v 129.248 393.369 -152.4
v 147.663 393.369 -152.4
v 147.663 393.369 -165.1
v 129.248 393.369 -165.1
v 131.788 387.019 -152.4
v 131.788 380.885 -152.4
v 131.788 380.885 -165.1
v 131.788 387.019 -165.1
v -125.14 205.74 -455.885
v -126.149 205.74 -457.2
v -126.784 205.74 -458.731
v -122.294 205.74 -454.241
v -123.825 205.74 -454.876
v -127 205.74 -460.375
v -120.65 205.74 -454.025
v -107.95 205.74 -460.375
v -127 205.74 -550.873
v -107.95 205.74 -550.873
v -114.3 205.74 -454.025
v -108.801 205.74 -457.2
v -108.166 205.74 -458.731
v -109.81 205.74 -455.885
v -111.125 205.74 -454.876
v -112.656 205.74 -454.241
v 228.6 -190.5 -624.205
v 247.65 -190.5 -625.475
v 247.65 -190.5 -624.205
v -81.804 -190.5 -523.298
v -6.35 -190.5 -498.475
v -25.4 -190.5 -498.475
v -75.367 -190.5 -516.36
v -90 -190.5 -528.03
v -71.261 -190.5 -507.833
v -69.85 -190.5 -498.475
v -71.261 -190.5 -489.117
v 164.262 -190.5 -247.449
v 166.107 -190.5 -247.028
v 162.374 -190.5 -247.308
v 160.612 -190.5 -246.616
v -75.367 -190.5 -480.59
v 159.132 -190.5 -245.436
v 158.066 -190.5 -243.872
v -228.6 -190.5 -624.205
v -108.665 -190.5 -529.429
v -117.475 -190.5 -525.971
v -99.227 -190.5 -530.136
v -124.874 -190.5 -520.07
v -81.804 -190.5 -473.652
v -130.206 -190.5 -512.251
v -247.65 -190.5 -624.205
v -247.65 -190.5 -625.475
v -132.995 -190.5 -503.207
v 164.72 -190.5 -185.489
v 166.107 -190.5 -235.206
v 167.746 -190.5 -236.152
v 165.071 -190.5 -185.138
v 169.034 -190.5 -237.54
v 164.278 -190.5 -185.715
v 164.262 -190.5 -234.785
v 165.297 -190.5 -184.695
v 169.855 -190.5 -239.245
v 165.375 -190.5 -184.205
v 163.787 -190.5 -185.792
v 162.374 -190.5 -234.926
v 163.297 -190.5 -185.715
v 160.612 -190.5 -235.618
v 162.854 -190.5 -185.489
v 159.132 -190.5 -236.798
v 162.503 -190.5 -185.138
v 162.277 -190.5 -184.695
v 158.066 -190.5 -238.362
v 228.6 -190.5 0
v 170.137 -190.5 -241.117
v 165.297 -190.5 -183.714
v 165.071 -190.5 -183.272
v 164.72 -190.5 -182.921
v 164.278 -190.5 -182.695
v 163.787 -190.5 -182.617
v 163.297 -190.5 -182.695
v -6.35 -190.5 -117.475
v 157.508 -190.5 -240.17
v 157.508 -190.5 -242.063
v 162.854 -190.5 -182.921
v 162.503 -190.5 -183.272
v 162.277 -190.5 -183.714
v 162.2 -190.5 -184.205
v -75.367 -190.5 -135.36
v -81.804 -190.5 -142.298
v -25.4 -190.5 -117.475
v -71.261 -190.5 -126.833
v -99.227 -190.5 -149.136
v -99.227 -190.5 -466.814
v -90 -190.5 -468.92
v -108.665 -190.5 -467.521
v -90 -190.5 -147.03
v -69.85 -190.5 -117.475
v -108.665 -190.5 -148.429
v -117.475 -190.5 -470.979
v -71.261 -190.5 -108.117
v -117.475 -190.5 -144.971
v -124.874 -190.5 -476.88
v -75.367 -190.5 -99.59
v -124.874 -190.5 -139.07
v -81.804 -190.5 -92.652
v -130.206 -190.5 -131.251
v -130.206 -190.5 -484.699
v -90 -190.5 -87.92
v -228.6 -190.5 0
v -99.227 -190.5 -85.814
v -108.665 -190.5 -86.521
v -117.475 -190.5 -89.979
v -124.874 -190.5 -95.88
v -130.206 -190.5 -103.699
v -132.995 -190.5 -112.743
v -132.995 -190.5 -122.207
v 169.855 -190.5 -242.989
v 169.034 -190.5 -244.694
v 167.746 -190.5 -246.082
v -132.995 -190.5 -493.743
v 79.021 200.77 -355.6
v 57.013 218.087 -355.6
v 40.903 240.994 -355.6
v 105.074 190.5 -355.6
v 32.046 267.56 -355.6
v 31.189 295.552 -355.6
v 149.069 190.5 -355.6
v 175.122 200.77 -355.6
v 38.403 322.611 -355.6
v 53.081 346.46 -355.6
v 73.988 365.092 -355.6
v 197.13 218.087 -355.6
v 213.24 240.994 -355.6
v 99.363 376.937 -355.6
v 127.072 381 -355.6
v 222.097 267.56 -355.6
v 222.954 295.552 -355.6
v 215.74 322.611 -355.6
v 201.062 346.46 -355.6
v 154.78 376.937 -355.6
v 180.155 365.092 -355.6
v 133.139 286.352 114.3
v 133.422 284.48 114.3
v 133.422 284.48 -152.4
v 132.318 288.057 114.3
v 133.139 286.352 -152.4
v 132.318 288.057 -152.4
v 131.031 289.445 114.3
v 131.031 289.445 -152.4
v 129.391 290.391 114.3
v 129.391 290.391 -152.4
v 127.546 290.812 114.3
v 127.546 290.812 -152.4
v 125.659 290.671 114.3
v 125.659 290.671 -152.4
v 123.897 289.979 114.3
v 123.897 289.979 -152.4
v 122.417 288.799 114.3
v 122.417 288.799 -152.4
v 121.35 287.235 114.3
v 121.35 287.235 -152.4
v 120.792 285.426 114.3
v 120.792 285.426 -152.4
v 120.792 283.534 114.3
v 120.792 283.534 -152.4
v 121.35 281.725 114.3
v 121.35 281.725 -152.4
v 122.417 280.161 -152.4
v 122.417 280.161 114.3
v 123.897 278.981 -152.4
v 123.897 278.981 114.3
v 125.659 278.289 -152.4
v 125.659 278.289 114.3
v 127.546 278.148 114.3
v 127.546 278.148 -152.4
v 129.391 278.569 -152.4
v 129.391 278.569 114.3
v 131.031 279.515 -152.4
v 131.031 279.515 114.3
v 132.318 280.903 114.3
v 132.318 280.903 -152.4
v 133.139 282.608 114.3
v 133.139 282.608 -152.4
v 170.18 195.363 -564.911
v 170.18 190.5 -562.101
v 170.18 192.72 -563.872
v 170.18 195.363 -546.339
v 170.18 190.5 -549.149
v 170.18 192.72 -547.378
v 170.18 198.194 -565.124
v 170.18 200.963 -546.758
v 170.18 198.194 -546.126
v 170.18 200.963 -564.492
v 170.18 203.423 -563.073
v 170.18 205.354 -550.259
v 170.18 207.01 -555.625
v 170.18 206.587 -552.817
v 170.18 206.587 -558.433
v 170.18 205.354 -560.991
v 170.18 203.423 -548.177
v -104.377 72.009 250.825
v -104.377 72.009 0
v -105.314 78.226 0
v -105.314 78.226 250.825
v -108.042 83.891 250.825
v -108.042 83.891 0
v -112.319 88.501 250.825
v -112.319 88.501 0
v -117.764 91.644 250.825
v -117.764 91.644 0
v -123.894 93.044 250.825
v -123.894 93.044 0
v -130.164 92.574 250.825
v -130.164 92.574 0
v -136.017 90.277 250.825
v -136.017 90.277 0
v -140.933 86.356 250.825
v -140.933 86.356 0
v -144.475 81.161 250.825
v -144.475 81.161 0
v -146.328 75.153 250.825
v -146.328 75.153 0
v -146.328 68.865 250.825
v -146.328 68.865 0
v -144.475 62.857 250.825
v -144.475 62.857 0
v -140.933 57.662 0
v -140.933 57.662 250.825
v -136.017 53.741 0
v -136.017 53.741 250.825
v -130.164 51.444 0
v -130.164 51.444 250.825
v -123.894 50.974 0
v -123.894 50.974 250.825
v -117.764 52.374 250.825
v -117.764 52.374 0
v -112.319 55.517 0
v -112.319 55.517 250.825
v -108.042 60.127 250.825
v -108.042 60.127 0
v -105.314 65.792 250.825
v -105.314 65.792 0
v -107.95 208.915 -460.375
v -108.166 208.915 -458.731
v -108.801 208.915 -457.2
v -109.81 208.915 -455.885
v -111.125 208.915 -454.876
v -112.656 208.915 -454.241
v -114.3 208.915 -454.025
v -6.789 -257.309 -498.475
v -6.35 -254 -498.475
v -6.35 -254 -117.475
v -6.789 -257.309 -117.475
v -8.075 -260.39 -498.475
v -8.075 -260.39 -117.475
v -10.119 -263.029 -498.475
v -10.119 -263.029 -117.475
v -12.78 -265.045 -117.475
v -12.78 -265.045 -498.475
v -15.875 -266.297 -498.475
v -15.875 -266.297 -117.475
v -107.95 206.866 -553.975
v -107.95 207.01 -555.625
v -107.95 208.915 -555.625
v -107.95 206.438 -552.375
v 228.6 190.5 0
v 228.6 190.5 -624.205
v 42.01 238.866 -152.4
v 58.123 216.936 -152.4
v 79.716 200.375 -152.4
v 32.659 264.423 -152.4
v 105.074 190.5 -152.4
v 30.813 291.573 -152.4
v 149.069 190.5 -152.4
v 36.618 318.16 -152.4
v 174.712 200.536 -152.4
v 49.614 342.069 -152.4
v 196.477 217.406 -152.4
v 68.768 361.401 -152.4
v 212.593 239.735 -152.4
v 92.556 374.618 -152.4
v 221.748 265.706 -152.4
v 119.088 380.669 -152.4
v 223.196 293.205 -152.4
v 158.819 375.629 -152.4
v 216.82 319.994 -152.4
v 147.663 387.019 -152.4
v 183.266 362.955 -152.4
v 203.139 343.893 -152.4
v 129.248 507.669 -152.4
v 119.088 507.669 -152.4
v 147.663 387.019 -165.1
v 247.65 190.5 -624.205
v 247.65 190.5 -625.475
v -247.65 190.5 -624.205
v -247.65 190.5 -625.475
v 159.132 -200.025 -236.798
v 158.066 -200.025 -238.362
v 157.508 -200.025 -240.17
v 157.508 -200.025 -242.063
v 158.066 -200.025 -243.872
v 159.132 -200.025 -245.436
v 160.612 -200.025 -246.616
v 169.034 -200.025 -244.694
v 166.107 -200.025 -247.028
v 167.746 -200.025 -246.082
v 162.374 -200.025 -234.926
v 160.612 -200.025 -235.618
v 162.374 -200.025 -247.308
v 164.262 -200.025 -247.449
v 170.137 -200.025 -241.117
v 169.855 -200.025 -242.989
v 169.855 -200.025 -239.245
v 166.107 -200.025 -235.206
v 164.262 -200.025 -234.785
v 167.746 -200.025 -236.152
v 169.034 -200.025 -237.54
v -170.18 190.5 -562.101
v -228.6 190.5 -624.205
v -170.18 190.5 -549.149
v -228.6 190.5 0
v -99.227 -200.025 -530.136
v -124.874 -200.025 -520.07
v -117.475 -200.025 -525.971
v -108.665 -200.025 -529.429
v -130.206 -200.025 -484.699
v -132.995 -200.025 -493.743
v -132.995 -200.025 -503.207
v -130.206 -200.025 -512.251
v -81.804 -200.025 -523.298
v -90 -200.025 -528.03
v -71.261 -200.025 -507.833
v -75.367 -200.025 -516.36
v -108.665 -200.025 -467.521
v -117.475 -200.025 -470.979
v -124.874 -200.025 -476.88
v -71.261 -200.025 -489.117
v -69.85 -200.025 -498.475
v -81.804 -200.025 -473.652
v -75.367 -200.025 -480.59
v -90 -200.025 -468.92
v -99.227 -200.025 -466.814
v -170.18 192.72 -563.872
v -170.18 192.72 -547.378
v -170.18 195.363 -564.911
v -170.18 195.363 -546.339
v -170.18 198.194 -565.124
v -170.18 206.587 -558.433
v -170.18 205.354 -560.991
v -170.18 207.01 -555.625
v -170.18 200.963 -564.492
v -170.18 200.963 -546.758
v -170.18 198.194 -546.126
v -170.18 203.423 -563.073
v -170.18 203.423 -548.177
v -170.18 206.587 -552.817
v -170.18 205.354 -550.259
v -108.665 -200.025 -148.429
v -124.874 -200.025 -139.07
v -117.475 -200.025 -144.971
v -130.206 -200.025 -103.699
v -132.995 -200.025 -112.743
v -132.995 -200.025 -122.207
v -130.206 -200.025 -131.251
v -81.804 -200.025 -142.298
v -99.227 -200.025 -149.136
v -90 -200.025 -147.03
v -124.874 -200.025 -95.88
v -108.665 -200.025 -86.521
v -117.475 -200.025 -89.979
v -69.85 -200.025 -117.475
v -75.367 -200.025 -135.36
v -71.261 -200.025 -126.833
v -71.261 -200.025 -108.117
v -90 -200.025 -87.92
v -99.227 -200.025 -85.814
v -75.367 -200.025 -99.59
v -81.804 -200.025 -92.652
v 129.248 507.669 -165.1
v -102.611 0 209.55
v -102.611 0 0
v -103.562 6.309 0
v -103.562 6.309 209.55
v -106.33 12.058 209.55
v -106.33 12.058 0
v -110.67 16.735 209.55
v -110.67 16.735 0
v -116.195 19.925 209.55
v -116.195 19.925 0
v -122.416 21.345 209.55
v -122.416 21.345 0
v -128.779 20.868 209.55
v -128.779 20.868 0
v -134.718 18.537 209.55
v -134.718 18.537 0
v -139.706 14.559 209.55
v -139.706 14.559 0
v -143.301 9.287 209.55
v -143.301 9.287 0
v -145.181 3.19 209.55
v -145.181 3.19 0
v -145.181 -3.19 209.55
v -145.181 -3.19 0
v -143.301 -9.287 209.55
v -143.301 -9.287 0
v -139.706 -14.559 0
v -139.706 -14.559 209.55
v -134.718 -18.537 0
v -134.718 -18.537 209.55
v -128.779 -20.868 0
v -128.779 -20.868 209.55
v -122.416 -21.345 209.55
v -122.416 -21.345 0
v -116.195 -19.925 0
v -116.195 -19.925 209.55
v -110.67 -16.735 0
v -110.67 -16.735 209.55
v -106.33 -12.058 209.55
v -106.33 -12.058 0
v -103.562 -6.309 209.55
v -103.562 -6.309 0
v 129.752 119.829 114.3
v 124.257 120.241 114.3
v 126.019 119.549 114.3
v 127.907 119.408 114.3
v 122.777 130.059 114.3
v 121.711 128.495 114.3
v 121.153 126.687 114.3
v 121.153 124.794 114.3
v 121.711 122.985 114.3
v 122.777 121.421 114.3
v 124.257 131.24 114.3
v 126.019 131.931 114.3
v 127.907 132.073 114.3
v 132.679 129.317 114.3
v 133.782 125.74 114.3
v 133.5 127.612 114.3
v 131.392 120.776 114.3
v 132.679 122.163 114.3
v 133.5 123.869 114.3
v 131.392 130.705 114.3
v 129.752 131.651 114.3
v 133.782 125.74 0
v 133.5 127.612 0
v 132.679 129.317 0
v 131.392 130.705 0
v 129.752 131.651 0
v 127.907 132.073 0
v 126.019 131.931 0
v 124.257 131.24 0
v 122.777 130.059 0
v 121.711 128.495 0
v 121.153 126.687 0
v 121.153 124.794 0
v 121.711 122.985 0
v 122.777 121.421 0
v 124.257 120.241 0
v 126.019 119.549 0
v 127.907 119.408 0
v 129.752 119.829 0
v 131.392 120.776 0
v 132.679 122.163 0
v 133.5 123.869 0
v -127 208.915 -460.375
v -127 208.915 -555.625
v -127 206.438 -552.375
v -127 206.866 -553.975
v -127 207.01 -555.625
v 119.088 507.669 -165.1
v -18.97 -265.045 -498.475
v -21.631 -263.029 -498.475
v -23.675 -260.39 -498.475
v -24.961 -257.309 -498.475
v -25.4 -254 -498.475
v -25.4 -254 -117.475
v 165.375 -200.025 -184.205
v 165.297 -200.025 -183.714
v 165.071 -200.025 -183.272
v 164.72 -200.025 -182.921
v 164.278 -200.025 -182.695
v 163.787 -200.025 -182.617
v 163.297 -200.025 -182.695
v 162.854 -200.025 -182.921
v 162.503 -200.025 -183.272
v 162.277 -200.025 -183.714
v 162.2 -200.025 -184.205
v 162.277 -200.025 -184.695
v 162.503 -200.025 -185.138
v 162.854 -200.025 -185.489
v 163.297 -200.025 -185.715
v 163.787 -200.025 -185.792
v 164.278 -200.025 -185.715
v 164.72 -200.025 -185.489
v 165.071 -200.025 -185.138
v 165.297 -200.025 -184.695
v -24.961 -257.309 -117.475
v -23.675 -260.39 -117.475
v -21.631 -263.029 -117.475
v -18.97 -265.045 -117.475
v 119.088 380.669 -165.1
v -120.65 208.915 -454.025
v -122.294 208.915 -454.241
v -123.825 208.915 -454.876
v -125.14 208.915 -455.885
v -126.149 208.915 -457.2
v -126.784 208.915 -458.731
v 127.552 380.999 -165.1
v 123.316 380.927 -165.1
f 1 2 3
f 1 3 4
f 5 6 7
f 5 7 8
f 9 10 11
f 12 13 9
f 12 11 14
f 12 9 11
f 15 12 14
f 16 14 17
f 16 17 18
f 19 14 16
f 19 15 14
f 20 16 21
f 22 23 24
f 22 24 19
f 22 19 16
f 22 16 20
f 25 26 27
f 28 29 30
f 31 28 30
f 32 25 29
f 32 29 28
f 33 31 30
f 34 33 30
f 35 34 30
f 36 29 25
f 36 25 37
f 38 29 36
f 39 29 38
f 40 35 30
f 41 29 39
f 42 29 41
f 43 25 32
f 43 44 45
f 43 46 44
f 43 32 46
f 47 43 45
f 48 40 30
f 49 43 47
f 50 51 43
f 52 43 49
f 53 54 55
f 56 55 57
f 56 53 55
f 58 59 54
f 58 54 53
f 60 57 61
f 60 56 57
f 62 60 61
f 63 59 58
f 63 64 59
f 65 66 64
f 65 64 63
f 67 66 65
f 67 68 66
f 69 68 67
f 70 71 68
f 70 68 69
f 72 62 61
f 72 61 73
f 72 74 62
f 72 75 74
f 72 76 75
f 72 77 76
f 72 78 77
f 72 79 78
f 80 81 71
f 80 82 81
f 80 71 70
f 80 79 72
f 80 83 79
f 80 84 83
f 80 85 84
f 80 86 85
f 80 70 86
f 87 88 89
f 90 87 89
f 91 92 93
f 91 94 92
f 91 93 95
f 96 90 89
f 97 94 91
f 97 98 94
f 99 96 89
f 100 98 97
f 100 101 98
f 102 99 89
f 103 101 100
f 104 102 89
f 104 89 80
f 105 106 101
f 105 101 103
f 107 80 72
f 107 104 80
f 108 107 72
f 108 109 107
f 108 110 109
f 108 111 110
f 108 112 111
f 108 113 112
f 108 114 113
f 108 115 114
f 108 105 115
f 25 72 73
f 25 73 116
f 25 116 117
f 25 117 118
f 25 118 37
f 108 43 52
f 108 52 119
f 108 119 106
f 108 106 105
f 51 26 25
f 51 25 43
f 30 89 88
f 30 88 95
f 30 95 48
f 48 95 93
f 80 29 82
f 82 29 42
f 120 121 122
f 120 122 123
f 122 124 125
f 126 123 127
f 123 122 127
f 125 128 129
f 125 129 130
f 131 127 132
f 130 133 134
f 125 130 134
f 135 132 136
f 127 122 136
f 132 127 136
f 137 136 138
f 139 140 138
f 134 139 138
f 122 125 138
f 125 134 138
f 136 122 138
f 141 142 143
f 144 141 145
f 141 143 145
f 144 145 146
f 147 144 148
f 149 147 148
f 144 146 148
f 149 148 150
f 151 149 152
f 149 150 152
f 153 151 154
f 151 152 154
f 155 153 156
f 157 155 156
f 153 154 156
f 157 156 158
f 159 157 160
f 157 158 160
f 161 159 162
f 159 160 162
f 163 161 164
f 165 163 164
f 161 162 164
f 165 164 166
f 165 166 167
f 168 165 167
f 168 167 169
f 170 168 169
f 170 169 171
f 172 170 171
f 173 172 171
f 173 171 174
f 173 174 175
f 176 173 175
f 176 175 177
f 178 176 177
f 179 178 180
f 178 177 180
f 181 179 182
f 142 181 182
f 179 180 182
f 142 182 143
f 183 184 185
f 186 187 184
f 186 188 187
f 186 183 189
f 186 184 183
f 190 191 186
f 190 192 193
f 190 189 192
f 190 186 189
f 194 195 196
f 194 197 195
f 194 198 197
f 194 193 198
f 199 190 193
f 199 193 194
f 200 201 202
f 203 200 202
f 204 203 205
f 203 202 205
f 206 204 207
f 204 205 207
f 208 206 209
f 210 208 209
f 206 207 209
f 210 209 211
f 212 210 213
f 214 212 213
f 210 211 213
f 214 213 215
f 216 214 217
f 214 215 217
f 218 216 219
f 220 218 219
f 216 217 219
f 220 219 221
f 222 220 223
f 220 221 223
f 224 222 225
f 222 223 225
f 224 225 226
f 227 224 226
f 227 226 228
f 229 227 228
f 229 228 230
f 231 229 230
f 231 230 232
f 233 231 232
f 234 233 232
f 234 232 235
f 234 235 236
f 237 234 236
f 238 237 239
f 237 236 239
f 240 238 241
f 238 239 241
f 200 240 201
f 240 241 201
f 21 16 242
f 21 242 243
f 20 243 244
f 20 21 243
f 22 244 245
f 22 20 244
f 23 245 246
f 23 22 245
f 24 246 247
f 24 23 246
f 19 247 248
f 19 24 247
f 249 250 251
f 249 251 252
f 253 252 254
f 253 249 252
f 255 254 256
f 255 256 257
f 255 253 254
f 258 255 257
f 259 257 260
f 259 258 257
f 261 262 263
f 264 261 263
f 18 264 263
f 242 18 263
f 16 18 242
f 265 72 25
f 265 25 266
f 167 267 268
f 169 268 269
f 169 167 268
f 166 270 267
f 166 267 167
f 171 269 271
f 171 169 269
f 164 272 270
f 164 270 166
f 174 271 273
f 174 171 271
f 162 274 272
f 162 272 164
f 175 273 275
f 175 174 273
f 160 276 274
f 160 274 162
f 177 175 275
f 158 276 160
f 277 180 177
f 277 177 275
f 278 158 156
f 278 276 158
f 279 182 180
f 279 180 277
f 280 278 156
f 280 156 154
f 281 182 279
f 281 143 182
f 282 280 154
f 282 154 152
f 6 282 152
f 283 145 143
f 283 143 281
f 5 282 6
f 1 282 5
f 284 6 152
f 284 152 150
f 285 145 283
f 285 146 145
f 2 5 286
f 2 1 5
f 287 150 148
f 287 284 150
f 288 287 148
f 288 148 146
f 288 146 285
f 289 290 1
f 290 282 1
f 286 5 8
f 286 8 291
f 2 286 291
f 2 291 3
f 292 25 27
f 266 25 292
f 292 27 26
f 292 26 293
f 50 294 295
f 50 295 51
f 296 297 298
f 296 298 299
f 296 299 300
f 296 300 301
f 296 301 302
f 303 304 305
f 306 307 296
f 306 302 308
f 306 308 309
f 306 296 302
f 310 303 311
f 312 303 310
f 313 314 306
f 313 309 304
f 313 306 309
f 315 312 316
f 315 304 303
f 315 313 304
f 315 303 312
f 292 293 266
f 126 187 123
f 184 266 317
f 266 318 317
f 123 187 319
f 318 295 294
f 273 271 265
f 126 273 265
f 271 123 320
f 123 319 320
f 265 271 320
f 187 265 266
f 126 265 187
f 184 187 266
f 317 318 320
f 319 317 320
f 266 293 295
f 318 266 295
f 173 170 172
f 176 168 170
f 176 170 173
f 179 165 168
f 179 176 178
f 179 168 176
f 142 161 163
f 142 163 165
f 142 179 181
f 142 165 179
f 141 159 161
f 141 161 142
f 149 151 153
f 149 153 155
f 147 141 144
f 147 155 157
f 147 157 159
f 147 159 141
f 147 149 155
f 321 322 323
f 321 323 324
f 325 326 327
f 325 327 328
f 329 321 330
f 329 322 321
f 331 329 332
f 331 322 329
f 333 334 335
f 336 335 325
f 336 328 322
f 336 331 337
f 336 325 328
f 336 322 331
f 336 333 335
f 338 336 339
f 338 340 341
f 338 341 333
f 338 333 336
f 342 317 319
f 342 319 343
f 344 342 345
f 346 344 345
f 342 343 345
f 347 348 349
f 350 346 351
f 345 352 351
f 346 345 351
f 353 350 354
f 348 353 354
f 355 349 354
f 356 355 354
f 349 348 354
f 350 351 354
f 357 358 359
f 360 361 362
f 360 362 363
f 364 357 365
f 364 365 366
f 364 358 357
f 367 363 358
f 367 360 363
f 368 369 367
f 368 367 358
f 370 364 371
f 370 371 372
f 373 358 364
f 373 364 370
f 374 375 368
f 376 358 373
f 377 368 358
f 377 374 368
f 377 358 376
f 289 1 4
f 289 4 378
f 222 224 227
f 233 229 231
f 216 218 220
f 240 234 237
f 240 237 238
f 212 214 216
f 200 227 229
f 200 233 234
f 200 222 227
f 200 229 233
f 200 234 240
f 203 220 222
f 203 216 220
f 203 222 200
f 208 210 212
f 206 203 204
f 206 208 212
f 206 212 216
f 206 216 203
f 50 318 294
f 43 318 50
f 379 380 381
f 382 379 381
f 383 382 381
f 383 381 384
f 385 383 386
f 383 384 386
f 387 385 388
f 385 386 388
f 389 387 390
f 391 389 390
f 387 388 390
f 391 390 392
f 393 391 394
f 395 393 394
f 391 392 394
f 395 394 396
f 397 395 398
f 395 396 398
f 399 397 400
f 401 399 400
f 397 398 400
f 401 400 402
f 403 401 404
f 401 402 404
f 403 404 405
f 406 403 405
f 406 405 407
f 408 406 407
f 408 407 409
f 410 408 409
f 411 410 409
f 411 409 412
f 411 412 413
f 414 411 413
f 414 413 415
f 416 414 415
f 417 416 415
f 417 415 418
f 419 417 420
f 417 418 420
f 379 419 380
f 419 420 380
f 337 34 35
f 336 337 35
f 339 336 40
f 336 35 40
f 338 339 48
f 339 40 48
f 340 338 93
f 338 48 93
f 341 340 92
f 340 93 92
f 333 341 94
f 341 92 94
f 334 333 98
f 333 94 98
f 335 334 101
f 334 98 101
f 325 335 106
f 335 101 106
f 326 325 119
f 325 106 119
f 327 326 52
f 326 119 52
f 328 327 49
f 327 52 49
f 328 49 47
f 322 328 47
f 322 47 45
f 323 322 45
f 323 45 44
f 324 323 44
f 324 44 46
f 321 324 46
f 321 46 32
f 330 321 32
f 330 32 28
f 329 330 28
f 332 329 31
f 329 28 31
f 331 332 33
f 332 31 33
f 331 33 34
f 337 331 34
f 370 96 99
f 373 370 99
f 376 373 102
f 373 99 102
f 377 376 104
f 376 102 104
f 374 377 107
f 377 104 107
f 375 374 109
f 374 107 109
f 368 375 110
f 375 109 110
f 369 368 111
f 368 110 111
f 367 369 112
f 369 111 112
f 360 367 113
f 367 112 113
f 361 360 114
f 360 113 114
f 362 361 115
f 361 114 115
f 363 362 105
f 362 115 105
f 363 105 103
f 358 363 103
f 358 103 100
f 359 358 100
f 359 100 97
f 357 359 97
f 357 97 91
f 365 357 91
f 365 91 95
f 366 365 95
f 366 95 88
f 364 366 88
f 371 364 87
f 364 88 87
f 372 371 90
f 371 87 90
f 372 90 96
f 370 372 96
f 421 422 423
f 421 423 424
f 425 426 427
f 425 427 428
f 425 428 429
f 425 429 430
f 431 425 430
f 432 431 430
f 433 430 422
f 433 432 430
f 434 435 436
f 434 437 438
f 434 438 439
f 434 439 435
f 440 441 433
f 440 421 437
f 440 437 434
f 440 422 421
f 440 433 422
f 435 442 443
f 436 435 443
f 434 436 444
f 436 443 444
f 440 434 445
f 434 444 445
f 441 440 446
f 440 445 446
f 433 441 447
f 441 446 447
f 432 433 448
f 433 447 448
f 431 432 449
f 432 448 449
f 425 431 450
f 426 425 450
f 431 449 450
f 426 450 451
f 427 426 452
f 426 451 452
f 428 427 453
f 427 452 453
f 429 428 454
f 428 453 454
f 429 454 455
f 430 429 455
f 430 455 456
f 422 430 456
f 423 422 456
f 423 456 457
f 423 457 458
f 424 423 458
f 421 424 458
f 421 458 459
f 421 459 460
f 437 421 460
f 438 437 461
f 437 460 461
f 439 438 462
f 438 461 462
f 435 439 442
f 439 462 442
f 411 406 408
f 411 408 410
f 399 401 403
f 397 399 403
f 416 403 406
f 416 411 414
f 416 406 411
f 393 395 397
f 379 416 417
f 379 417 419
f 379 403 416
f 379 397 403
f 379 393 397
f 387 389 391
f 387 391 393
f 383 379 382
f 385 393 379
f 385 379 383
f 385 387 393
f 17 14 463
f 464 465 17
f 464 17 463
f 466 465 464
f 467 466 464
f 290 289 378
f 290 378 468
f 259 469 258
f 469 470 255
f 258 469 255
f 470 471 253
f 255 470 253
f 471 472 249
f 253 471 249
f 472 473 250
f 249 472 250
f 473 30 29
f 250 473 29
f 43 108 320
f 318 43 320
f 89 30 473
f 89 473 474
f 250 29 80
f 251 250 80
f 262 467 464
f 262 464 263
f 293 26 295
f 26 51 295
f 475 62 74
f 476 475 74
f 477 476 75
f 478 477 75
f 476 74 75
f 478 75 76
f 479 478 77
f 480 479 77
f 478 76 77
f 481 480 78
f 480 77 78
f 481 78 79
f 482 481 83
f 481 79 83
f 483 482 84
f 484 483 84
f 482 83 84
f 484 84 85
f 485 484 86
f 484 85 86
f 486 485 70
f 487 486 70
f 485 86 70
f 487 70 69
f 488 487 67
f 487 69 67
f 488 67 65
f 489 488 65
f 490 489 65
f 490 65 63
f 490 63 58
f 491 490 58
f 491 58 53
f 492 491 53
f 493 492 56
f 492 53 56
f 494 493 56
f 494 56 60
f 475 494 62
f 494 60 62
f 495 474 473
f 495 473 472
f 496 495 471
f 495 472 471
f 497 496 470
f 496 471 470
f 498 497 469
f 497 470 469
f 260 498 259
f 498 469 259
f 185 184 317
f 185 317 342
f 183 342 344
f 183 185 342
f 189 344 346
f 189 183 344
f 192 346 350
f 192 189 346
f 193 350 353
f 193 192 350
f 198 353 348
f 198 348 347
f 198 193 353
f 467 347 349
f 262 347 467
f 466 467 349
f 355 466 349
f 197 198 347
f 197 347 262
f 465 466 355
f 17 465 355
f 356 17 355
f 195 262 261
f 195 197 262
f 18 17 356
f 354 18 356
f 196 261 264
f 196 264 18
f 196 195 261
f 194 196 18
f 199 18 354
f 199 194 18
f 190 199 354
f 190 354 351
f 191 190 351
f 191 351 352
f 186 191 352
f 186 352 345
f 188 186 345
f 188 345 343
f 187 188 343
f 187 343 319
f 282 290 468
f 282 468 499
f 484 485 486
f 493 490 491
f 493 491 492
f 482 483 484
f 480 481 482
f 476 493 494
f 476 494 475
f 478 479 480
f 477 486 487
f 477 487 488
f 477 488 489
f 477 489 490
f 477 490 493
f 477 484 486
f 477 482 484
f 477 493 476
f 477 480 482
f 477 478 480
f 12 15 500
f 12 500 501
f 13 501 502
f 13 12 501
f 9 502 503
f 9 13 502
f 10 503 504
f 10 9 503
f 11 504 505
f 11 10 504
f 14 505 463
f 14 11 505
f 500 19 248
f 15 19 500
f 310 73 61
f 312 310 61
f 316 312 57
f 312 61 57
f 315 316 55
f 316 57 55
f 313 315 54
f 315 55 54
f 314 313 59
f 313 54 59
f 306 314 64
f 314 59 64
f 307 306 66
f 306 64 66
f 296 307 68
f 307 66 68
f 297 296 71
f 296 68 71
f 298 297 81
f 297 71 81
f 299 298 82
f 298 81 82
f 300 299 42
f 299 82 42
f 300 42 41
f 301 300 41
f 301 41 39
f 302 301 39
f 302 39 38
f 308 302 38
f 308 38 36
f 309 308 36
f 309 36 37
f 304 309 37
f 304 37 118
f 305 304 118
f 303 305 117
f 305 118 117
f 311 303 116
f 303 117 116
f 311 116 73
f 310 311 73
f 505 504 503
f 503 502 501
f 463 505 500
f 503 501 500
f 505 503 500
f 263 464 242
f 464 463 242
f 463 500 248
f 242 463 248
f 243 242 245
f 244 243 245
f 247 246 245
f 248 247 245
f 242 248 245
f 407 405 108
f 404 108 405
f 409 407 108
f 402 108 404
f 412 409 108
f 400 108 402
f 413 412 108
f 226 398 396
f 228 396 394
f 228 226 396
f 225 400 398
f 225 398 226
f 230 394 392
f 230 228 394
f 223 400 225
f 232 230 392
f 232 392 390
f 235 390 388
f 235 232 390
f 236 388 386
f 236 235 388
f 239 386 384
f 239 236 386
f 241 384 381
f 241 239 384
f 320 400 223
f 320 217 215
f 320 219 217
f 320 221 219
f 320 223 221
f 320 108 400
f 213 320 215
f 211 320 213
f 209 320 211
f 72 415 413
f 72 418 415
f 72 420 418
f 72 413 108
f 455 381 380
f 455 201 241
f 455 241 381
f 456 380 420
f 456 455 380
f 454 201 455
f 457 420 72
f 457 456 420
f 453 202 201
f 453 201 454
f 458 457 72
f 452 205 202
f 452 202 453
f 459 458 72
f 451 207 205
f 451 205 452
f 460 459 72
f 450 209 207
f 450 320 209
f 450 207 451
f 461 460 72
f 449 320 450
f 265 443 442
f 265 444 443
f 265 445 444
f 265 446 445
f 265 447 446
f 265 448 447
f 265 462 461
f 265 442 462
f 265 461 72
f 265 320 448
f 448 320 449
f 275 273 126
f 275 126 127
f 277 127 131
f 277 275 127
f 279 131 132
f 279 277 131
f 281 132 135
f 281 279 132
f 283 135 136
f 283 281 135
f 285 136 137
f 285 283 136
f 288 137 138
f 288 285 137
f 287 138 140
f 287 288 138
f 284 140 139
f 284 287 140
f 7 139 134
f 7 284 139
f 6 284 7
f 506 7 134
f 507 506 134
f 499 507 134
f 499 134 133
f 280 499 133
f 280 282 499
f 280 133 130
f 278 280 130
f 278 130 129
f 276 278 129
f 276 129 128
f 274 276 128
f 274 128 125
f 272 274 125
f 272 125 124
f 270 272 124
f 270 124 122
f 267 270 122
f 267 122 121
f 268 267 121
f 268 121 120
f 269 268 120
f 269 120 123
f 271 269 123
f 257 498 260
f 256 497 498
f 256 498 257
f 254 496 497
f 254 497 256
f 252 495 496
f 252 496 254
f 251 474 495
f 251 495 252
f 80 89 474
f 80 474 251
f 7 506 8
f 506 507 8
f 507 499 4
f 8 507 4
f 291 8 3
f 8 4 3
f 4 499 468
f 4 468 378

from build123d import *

# Parameters (mm, degrees)
F0_W         = 457.2
F0_H         = 381
F1_DEPTH     = 625.475
F2_R         = 21.0935486288
F3_DEPTH     = 250.825
F4_R         = 21.4047690014
F5_DEPTH     = 209.55
F6_R         = 31.75
F6_R_2       = 1.5875
F6_R_3       = 6.35
F7_DEPTH     = 9.525
F8_W         = 19.05
F8_H         = 381
F9_DEPTH     = 76.2
F10_T1_DEPTH = 444.5
F12_R        = 96.52
F13_DEPTH    = 203.2
F15_DEPTH    = 12.7
F16_R        = 6.35
F17_DEPTH    = 266.7
F18_R        = 6.35
F19_DEPTH    = 114.3
F20_R        = 9.525
F21_DEPTH    = 170.18
F22_W        = 381
F22_H        = 1.27
F23_DEPTH    = 19.05
F24_W        = 381
F24_H        = 1.27
F25_DEPTH    = 19.05
F28_DEPTH    = 3.175


# Not quite as in the source:
# - a fillet or chamfer that OpenCascade refuses, or shapes differently, is made with other operations: its cross-section is extruded or revolved along the edge and cut away or added


with BuildPart() as f1:
    # F0 (on Top) → F1 (new body)
    with BuildSketch(Plane.XY):
        Rectangle(F0_W, F0_H)
    extrude(amount=-F1_DEPTH)

    # F2 (on face) → F3 (join)
    with BuildSketch(Plane.XY):
        with Locations((-125.4702359438, 72.0090046525)):
            Circle(F2_R)
    extrude(amount=F3_DEPTH)

    # F4 (on face) → F5 (join)
    with BuildSketch(Plane.XY):
        with Locations((-124.0155026317, 0)):
            Circle(F4_R)
    extrude(amount=F5_DEPTH)

    # F6 (on face) → F7 (join)
    with BuildSketch(Plane.XZ.offset(190.5)):
        with Locations((-101.6, -117.475)):
            Circle(F6_R)
        with Locations((-101.6, -498.475)):
            Circle(F6_R)
        with Locations((163.7871414423, -184.2048317194)):
            Circle(F6_R_2)
        with Locations((163.7871414423, -241.1169111729)):
            Circle(F6_R_3)
    extrude(amount=F7_DEPTH)

    # F8 (on face) → F9 (join)
    with BuildSketch(Plane.XZ.offset(190.5)):
        with Locations((-15.875, -307.975)):
            Rectangle(F8_W, F8_H)
    extrude(amount=F9_DEPTH)

    # F10: fillet of radius 12.7 on 2 edges, made by hand

    # F10_s2 → F10_t1 (cut)
    with BuildSketch(Plane.XY.offset(-530.225)):
        with BuildLine():
            ThreePointArc((-25.4, -254), (-21.6802561211, -262.9802561211), (-12.7, -266.7))
            Line((-12.7, -266.7), (-25.4, -266.7))
            Line((-25.4, -266.7), (-25.4, -254))
        make_face()
        with BuildLine():
            ThreePointArc((-6.35, -254), (-10.0697438789, -262.9802561211), (-19.05, -266.7))
            Line((-19.05, -266.7), (-6.35, -266.7))
            Line((-6.35, -266.7), (-6.35, -254))
        make_face()
    extrude(amount=F10_T1_DEPTH, mode=Mode.SUBTRACT)

    # F12 (on offset) → F13 (join)
    with BuildSketch(Plane.XY.offset(-152.4)):
        with Locations((127.0715296268, 284.48)):
            Circle(F12_R)
    extrude(amount=-F13_DEPTH)

    # F14 (on face) → F15 (join)
    with BuildSketch(Plane.XY.offset(-152.4)):
        Polygon((119.0875349175, 393.3692209579), (119.0875349175, 380.6692209579), (131.7875349175, 380.8847182149), (131.7875349175, 387.0192209579), (147.6625349175, 387.0192209579), (147.6625349175, 393.3692209579), (129.2475349175, 393.3692209579), (129.2475349175, 507.6692209579), (119.0875349175, 507.6692209579), align=None)
    extrude(amount=-F15_DEPTH)

    # F16 (on face) → F17 (join)
    with BuildSketch(Plane.XY.offset(-152.4)):
        with Locations((127.0715296268, 284.48)):
            Circle(F16_R)
    extrude(amount=F17_DEPTH)

    # F18 (on face) → F19 (join)
    with BuildSketch(Plane.XY):
        with Locations((127.4323694774, 125.7402606834)):
            Circle(F18_R)
    extrude(amount=F19_DEPTH)

    # F20 (on Right) → F21 (join, symmetric)
    with BuildSketch(Plane.YZ):
        with Locations((197.485, -555.625)):
            Circle(F20_R)
    extrude(amount=F21_DEPTH, both=True)

    # F22 (on face) → F23 (join)
    with BuildSketch(Plane(origin=(-228.6, 0, 0), x_dir=(0, -1, 0), z_dir=(-1, 0, 0))):
        with Locations((0, -624.84)):
            Rectangle(F22_W, F22_H)
    extrude(amount=F23_DEPTH)

    # F24 (on face) → F25 (join)
    with BuildSketch(Plane.YZ.offset(228.6)):
        with Locations((0, -624.84)):
            Rectangle(F24_W, F24_H)
    extrude(amount=F25_DEPTH)

    # F27 (on offset) → F28 (join)
    with BuildSketch(Plane.XZ.offset(-205.74)):
        with BuildLine():
            Line((-127, -555.625), (-107.95, -555.625))
            Line((-107.95, -555.625), (-107.95, -460.375))
            ThreePointArc((-107.95, -460.375), (-109.8098719395, -455.8848719395), (-114.3, -454.025))
            Line((-114.3, -454.025), (-120.65, -454.025))
            ThreePointArc((-120.65, -454.025), (-125.1401280605, -455.8848719395), (-127, -460.375))
            Line((-127, -460.375), (-127, -555.625))
        make_face()
    extrude(amount=-F28_DEPTH)


solid = f1.part
